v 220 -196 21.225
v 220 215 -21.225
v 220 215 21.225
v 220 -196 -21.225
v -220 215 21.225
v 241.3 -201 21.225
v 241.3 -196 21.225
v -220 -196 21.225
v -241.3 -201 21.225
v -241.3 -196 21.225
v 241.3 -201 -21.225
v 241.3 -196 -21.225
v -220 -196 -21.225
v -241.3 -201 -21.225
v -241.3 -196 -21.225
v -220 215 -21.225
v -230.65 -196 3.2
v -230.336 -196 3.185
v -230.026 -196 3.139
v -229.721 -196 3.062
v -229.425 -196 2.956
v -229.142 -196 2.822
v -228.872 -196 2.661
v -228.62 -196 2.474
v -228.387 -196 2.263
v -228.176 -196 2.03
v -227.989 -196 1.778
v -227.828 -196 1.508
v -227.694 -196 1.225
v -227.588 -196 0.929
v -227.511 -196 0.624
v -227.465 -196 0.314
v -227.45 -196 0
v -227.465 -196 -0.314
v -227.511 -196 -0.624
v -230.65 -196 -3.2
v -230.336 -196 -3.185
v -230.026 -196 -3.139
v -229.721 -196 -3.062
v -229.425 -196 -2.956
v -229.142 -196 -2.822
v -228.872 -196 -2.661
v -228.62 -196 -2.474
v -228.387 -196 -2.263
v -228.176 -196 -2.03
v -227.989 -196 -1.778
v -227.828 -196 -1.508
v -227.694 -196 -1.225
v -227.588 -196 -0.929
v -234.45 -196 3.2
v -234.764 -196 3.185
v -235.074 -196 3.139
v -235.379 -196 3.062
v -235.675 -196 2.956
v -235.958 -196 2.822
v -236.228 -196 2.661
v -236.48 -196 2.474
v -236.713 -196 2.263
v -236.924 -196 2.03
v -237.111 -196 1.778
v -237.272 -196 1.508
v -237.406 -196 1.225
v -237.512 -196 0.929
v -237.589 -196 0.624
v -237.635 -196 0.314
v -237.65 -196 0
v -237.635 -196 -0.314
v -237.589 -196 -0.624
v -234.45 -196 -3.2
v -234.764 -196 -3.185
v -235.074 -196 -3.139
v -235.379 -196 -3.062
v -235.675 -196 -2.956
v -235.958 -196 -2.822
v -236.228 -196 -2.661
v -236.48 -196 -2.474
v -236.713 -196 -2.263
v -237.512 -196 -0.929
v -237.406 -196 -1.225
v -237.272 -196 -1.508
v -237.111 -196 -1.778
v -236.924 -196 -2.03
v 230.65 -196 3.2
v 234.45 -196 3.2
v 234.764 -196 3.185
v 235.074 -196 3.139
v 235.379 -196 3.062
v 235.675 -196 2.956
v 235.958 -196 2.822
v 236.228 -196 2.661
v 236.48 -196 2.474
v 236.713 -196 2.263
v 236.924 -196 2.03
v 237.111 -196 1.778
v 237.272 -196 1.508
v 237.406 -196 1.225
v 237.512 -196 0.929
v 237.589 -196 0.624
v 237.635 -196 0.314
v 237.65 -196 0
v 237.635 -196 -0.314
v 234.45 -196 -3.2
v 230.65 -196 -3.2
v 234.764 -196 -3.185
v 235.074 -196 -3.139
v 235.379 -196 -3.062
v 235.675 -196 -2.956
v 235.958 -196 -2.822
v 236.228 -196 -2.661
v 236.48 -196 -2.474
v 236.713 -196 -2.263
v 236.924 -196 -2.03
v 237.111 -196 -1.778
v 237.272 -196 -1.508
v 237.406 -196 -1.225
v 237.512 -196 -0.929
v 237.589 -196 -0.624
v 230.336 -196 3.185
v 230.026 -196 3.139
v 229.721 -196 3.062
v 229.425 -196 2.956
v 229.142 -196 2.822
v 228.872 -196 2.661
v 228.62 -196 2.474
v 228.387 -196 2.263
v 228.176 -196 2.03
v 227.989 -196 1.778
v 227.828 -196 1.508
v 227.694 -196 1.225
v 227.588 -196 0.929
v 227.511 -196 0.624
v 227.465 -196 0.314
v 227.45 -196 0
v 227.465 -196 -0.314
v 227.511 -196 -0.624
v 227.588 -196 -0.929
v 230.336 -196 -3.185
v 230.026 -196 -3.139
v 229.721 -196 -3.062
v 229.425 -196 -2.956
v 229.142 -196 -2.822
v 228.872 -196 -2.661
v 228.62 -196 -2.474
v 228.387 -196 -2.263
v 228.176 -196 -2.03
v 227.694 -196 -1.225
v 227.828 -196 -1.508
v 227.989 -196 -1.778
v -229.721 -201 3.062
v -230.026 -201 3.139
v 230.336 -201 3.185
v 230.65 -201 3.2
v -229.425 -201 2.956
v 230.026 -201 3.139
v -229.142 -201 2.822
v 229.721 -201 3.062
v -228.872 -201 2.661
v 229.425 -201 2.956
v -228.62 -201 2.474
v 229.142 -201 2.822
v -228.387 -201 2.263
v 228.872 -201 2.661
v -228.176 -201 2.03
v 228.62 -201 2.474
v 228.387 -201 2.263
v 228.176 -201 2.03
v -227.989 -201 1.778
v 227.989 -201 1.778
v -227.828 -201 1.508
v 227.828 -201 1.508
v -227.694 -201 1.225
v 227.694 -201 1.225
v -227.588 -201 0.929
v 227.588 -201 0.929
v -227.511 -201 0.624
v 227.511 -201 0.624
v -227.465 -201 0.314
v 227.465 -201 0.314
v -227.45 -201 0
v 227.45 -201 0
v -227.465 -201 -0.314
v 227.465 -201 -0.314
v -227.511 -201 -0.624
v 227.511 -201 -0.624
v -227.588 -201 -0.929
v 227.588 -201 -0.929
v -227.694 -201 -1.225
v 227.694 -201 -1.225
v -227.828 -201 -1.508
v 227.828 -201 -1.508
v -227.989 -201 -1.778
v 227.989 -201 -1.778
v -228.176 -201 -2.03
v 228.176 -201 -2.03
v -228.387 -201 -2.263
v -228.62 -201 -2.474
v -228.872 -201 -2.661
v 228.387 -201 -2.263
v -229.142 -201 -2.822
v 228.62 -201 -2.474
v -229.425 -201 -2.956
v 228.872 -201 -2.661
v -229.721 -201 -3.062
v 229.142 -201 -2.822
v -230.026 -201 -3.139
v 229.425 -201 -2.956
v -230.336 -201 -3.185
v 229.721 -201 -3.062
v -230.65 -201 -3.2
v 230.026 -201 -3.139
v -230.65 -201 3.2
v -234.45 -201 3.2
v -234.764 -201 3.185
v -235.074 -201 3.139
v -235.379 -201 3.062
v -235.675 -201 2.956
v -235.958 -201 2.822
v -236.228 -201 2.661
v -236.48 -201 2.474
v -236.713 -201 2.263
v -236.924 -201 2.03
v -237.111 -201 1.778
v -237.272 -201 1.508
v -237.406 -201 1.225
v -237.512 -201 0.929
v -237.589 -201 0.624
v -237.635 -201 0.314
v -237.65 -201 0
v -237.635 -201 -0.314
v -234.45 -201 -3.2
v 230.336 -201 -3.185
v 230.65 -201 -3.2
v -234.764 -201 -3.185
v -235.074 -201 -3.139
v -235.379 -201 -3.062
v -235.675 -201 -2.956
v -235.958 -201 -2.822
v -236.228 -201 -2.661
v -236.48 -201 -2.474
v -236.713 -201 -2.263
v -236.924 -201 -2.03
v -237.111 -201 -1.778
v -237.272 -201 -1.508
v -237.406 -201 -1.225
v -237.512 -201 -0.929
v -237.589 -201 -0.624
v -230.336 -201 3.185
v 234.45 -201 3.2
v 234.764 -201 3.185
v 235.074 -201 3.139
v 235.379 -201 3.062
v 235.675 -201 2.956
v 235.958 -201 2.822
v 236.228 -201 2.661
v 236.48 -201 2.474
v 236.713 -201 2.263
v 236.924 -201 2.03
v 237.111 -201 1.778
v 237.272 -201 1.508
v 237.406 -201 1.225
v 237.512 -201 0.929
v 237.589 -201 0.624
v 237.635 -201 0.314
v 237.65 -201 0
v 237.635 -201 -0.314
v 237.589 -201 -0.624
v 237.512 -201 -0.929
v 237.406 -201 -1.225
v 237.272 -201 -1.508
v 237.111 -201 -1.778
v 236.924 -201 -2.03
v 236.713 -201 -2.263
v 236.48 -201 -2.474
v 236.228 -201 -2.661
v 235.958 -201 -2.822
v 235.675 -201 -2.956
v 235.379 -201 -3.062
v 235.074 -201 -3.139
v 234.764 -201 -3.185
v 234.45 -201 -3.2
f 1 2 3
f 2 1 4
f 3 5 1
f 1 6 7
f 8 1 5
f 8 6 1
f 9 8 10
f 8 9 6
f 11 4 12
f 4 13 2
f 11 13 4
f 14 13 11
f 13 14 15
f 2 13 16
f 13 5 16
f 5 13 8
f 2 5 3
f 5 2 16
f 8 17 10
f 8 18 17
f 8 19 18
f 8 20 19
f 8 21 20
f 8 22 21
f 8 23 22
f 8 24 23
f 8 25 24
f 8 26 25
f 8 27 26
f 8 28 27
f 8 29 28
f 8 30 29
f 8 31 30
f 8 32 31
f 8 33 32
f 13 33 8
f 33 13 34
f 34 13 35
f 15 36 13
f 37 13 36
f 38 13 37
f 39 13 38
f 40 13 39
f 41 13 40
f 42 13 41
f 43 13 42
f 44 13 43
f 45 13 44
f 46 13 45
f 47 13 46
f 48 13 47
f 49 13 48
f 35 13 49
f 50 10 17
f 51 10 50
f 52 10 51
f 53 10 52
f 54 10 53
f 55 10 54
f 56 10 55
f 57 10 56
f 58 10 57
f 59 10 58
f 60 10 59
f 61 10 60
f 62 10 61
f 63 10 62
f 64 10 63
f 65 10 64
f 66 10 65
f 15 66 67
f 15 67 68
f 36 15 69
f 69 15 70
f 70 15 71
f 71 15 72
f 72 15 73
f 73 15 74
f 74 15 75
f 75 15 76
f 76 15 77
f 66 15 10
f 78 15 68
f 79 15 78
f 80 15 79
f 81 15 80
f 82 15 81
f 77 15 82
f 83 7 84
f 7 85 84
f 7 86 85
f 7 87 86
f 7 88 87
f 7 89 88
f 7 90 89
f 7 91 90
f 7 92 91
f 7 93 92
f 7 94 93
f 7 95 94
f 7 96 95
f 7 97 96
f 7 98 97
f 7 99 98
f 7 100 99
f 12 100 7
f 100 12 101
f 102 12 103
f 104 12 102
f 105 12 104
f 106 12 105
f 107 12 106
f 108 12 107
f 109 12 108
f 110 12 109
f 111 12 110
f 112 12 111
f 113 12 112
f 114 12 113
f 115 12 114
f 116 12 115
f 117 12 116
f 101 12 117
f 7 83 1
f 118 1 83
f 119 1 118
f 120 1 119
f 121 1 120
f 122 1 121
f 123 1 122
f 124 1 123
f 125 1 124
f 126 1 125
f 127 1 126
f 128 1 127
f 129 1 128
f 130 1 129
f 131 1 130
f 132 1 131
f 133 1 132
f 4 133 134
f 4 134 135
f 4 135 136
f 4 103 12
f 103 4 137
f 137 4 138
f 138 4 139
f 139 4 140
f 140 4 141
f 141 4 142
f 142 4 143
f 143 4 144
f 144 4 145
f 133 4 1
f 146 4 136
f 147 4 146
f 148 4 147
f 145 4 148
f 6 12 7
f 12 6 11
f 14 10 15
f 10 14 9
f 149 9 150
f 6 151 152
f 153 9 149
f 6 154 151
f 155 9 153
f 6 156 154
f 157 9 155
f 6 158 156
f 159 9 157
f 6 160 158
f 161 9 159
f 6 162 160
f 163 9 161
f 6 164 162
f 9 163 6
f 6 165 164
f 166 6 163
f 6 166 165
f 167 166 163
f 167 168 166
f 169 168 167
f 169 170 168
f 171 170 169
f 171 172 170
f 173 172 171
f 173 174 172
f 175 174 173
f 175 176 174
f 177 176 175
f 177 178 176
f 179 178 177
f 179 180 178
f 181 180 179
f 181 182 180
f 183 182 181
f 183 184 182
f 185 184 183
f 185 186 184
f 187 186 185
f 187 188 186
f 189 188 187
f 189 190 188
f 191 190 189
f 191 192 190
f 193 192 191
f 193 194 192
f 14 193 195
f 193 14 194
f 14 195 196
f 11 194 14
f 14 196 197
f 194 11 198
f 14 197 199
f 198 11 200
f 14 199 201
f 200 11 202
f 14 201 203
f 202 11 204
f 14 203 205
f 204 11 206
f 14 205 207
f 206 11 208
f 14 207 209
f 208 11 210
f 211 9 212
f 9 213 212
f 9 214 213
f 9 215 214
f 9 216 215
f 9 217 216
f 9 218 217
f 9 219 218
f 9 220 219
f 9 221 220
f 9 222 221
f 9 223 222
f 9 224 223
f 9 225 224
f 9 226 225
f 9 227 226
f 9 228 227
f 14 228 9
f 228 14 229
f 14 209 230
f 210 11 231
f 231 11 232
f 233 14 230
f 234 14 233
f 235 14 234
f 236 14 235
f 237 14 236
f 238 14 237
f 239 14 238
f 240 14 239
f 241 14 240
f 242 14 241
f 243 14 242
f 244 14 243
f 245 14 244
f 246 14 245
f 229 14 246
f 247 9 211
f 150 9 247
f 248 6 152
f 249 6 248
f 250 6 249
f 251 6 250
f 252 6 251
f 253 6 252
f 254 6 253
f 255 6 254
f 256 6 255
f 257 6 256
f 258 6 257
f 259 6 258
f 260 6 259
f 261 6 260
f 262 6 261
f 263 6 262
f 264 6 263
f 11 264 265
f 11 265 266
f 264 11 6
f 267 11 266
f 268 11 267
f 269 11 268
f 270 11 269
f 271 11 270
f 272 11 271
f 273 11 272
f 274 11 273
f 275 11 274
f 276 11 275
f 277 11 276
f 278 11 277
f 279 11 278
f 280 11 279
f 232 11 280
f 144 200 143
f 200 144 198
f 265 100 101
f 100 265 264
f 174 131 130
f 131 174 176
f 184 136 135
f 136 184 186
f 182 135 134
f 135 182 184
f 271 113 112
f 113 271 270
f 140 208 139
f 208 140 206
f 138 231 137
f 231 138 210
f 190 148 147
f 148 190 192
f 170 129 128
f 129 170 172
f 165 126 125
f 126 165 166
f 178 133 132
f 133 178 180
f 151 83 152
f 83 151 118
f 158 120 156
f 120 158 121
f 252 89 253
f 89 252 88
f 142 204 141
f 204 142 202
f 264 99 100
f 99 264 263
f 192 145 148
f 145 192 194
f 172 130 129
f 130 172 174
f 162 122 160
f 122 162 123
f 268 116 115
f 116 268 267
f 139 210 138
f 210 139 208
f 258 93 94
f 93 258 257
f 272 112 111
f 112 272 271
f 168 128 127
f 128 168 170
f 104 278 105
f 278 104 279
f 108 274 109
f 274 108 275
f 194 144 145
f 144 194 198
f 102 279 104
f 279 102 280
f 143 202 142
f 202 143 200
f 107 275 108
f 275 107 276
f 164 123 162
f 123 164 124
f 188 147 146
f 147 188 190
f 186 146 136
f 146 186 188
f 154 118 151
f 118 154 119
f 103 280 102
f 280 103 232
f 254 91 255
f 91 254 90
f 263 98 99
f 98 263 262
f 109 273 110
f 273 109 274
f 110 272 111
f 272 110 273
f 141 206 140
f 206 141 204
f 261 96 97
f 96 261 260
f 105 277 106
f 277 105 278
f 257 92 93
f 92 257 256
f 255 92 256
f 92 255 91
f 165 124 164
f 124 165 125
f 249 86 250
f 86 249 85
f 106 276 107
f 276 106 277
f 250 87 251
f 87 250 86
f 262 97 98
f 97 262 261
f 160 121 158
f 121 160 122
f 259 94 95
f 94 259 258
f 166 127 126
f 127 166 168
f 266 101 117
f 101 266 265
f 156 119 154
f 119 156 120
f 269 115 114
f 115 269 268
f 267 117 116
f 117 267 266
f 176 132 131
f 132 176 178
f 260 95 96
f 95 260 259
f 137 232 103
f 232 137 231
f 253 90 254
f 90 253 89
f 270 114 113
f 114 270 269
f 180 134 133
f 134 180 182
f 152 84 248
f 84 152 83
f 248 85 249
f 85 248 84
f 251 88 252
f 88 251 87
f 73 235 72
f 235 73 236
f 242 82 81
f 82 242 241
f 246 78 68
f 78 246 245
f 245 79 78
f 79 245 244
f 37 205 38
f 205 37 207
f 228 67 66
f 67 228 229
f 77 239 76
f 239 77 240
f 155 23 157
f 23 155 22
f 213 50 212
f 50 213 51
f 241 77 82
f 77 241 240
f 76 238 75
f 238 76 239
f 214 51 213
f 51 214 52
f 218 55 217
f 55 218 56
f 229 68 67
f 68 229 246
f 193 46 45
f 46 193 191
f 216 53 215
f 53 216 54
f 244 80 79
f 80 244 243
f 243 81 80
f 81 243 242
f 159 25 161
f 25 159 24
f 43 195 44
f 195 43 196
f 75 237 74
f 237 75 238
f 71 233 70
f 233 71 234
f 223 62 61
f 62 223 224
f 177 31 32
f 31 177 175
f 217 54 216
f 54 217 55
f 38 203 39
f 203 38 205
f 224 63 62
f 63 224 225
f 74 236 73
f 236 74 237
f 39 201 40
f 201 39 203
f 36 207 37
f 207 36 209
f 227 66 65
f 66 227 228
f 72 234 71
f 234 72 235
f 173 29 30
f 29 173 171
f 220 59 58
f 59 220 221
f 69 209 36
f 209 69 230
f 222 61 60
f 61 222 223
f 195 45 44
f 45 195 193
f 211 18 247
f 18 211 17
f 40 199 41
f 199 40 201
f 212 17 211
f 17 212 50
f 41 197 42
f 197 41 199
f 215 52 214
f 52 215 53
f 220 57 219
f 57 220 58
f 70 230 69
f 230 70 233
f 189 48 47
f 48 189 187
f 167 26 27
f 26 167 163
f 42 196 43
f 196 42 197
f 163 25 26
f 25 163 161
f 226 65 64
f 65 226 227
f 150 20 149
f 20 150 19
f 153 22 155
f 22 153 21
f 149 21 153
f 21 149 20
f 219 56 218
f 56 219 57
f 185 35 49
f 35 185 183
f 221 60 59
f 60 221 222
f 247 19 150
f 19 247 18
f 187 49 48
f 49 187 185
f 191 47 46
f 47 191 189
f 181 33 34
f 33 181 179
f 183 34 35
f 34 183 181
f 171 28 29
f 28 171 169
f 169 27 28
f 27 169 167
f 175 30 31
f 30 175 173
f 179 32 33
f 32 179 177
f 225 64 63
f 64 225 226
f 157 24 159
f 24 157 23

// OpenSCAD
// ============================================================================
// Atom Lithography Machine — Parametric OpenSCAD Module (S1.3-03)
// ============================================================================
// part_id           : S1.3-03
// parent_bom_id     : S1.3
// subsystem         : S1
// part_name         : Hassas kolon HV gerilim bolucu ve aktif dalgalilik filtresi
// material          : Al 6061
// temp_stage        : 300 K (kabin)
// vacuum_grade      : Atmosfer
// tolerance         : ±0.01% gerilim
// computed_mass_kg  : 5.35001
// envelope_mm       : 482.600 x 442.500 x 42.450
// design_maturity   : M0_M1_DETAILED_CAD_DESIGN_ONLY
// no_lab_measurement: true
// iec61508_certified: false
// semi_s2_certified : false
// Units: millimeters (mm)
// ============================================================================

$fn = 64;

// Nominal bounding envelope parameters (mm)
bbox_x = 482.6000;
bbox_y = 442.5000;
bbox_z = 42.4500;

// Part-specific parametric dimensions
rack_u = 1;
u_slot = "U34";
v_land_kV = 5.0;
dE_over_E = 0.0001;

// Interface / port parameters (mm)
port_hv_divider_out_od = 14.000;

module part_S1_3_03() {
  difference() {
    union() {
      // 1U hollow 19-in chassis body (width along X)
      translate([0.000, 9.500, 0.000]) cube([440.000, 411.000, 42.450], center=true);
      // EIA-310 19-in front panel w/ mounting ears facing -Y
      translate([0.000, -198.500, 0.000]) cube([482.600, 5.000, 42.450], center=true);
    }
    // EIA-310 +X rack slot
    translate([232.550, -198.500, 0.000]) rotate([90.000, 0.000, 0.000]) {
      hull() {
        translate([-1.900, 0, 0]) cylinder(d=6.400, h=9.000, center=true);
        translate([1.900, 0, 0]) cylinder(d=6.400, h=9.000, center=true);
      }
    }
    // EIA-310 -X rack slot
    translate([-232.550, -198.500, 0.000]) rotate([90.000, 0.000, 0.000]) {
      hull() {
        translate([-1.900, 0, 0]) cylinder(d=6.400, h=9.000, center=true);
        translate([1.900, 0, 0]) cylinder(d=6.400, h=9.000, center=true);
      }
    }
  }
}

// World assembly mounting transform (global machine frame, mm / deg):
// translate([1480.000, -223.000, 1079.075]) rotate([0.000, 0.000, 0.000]) part_S1_3_03();

part_S1_3_03();
